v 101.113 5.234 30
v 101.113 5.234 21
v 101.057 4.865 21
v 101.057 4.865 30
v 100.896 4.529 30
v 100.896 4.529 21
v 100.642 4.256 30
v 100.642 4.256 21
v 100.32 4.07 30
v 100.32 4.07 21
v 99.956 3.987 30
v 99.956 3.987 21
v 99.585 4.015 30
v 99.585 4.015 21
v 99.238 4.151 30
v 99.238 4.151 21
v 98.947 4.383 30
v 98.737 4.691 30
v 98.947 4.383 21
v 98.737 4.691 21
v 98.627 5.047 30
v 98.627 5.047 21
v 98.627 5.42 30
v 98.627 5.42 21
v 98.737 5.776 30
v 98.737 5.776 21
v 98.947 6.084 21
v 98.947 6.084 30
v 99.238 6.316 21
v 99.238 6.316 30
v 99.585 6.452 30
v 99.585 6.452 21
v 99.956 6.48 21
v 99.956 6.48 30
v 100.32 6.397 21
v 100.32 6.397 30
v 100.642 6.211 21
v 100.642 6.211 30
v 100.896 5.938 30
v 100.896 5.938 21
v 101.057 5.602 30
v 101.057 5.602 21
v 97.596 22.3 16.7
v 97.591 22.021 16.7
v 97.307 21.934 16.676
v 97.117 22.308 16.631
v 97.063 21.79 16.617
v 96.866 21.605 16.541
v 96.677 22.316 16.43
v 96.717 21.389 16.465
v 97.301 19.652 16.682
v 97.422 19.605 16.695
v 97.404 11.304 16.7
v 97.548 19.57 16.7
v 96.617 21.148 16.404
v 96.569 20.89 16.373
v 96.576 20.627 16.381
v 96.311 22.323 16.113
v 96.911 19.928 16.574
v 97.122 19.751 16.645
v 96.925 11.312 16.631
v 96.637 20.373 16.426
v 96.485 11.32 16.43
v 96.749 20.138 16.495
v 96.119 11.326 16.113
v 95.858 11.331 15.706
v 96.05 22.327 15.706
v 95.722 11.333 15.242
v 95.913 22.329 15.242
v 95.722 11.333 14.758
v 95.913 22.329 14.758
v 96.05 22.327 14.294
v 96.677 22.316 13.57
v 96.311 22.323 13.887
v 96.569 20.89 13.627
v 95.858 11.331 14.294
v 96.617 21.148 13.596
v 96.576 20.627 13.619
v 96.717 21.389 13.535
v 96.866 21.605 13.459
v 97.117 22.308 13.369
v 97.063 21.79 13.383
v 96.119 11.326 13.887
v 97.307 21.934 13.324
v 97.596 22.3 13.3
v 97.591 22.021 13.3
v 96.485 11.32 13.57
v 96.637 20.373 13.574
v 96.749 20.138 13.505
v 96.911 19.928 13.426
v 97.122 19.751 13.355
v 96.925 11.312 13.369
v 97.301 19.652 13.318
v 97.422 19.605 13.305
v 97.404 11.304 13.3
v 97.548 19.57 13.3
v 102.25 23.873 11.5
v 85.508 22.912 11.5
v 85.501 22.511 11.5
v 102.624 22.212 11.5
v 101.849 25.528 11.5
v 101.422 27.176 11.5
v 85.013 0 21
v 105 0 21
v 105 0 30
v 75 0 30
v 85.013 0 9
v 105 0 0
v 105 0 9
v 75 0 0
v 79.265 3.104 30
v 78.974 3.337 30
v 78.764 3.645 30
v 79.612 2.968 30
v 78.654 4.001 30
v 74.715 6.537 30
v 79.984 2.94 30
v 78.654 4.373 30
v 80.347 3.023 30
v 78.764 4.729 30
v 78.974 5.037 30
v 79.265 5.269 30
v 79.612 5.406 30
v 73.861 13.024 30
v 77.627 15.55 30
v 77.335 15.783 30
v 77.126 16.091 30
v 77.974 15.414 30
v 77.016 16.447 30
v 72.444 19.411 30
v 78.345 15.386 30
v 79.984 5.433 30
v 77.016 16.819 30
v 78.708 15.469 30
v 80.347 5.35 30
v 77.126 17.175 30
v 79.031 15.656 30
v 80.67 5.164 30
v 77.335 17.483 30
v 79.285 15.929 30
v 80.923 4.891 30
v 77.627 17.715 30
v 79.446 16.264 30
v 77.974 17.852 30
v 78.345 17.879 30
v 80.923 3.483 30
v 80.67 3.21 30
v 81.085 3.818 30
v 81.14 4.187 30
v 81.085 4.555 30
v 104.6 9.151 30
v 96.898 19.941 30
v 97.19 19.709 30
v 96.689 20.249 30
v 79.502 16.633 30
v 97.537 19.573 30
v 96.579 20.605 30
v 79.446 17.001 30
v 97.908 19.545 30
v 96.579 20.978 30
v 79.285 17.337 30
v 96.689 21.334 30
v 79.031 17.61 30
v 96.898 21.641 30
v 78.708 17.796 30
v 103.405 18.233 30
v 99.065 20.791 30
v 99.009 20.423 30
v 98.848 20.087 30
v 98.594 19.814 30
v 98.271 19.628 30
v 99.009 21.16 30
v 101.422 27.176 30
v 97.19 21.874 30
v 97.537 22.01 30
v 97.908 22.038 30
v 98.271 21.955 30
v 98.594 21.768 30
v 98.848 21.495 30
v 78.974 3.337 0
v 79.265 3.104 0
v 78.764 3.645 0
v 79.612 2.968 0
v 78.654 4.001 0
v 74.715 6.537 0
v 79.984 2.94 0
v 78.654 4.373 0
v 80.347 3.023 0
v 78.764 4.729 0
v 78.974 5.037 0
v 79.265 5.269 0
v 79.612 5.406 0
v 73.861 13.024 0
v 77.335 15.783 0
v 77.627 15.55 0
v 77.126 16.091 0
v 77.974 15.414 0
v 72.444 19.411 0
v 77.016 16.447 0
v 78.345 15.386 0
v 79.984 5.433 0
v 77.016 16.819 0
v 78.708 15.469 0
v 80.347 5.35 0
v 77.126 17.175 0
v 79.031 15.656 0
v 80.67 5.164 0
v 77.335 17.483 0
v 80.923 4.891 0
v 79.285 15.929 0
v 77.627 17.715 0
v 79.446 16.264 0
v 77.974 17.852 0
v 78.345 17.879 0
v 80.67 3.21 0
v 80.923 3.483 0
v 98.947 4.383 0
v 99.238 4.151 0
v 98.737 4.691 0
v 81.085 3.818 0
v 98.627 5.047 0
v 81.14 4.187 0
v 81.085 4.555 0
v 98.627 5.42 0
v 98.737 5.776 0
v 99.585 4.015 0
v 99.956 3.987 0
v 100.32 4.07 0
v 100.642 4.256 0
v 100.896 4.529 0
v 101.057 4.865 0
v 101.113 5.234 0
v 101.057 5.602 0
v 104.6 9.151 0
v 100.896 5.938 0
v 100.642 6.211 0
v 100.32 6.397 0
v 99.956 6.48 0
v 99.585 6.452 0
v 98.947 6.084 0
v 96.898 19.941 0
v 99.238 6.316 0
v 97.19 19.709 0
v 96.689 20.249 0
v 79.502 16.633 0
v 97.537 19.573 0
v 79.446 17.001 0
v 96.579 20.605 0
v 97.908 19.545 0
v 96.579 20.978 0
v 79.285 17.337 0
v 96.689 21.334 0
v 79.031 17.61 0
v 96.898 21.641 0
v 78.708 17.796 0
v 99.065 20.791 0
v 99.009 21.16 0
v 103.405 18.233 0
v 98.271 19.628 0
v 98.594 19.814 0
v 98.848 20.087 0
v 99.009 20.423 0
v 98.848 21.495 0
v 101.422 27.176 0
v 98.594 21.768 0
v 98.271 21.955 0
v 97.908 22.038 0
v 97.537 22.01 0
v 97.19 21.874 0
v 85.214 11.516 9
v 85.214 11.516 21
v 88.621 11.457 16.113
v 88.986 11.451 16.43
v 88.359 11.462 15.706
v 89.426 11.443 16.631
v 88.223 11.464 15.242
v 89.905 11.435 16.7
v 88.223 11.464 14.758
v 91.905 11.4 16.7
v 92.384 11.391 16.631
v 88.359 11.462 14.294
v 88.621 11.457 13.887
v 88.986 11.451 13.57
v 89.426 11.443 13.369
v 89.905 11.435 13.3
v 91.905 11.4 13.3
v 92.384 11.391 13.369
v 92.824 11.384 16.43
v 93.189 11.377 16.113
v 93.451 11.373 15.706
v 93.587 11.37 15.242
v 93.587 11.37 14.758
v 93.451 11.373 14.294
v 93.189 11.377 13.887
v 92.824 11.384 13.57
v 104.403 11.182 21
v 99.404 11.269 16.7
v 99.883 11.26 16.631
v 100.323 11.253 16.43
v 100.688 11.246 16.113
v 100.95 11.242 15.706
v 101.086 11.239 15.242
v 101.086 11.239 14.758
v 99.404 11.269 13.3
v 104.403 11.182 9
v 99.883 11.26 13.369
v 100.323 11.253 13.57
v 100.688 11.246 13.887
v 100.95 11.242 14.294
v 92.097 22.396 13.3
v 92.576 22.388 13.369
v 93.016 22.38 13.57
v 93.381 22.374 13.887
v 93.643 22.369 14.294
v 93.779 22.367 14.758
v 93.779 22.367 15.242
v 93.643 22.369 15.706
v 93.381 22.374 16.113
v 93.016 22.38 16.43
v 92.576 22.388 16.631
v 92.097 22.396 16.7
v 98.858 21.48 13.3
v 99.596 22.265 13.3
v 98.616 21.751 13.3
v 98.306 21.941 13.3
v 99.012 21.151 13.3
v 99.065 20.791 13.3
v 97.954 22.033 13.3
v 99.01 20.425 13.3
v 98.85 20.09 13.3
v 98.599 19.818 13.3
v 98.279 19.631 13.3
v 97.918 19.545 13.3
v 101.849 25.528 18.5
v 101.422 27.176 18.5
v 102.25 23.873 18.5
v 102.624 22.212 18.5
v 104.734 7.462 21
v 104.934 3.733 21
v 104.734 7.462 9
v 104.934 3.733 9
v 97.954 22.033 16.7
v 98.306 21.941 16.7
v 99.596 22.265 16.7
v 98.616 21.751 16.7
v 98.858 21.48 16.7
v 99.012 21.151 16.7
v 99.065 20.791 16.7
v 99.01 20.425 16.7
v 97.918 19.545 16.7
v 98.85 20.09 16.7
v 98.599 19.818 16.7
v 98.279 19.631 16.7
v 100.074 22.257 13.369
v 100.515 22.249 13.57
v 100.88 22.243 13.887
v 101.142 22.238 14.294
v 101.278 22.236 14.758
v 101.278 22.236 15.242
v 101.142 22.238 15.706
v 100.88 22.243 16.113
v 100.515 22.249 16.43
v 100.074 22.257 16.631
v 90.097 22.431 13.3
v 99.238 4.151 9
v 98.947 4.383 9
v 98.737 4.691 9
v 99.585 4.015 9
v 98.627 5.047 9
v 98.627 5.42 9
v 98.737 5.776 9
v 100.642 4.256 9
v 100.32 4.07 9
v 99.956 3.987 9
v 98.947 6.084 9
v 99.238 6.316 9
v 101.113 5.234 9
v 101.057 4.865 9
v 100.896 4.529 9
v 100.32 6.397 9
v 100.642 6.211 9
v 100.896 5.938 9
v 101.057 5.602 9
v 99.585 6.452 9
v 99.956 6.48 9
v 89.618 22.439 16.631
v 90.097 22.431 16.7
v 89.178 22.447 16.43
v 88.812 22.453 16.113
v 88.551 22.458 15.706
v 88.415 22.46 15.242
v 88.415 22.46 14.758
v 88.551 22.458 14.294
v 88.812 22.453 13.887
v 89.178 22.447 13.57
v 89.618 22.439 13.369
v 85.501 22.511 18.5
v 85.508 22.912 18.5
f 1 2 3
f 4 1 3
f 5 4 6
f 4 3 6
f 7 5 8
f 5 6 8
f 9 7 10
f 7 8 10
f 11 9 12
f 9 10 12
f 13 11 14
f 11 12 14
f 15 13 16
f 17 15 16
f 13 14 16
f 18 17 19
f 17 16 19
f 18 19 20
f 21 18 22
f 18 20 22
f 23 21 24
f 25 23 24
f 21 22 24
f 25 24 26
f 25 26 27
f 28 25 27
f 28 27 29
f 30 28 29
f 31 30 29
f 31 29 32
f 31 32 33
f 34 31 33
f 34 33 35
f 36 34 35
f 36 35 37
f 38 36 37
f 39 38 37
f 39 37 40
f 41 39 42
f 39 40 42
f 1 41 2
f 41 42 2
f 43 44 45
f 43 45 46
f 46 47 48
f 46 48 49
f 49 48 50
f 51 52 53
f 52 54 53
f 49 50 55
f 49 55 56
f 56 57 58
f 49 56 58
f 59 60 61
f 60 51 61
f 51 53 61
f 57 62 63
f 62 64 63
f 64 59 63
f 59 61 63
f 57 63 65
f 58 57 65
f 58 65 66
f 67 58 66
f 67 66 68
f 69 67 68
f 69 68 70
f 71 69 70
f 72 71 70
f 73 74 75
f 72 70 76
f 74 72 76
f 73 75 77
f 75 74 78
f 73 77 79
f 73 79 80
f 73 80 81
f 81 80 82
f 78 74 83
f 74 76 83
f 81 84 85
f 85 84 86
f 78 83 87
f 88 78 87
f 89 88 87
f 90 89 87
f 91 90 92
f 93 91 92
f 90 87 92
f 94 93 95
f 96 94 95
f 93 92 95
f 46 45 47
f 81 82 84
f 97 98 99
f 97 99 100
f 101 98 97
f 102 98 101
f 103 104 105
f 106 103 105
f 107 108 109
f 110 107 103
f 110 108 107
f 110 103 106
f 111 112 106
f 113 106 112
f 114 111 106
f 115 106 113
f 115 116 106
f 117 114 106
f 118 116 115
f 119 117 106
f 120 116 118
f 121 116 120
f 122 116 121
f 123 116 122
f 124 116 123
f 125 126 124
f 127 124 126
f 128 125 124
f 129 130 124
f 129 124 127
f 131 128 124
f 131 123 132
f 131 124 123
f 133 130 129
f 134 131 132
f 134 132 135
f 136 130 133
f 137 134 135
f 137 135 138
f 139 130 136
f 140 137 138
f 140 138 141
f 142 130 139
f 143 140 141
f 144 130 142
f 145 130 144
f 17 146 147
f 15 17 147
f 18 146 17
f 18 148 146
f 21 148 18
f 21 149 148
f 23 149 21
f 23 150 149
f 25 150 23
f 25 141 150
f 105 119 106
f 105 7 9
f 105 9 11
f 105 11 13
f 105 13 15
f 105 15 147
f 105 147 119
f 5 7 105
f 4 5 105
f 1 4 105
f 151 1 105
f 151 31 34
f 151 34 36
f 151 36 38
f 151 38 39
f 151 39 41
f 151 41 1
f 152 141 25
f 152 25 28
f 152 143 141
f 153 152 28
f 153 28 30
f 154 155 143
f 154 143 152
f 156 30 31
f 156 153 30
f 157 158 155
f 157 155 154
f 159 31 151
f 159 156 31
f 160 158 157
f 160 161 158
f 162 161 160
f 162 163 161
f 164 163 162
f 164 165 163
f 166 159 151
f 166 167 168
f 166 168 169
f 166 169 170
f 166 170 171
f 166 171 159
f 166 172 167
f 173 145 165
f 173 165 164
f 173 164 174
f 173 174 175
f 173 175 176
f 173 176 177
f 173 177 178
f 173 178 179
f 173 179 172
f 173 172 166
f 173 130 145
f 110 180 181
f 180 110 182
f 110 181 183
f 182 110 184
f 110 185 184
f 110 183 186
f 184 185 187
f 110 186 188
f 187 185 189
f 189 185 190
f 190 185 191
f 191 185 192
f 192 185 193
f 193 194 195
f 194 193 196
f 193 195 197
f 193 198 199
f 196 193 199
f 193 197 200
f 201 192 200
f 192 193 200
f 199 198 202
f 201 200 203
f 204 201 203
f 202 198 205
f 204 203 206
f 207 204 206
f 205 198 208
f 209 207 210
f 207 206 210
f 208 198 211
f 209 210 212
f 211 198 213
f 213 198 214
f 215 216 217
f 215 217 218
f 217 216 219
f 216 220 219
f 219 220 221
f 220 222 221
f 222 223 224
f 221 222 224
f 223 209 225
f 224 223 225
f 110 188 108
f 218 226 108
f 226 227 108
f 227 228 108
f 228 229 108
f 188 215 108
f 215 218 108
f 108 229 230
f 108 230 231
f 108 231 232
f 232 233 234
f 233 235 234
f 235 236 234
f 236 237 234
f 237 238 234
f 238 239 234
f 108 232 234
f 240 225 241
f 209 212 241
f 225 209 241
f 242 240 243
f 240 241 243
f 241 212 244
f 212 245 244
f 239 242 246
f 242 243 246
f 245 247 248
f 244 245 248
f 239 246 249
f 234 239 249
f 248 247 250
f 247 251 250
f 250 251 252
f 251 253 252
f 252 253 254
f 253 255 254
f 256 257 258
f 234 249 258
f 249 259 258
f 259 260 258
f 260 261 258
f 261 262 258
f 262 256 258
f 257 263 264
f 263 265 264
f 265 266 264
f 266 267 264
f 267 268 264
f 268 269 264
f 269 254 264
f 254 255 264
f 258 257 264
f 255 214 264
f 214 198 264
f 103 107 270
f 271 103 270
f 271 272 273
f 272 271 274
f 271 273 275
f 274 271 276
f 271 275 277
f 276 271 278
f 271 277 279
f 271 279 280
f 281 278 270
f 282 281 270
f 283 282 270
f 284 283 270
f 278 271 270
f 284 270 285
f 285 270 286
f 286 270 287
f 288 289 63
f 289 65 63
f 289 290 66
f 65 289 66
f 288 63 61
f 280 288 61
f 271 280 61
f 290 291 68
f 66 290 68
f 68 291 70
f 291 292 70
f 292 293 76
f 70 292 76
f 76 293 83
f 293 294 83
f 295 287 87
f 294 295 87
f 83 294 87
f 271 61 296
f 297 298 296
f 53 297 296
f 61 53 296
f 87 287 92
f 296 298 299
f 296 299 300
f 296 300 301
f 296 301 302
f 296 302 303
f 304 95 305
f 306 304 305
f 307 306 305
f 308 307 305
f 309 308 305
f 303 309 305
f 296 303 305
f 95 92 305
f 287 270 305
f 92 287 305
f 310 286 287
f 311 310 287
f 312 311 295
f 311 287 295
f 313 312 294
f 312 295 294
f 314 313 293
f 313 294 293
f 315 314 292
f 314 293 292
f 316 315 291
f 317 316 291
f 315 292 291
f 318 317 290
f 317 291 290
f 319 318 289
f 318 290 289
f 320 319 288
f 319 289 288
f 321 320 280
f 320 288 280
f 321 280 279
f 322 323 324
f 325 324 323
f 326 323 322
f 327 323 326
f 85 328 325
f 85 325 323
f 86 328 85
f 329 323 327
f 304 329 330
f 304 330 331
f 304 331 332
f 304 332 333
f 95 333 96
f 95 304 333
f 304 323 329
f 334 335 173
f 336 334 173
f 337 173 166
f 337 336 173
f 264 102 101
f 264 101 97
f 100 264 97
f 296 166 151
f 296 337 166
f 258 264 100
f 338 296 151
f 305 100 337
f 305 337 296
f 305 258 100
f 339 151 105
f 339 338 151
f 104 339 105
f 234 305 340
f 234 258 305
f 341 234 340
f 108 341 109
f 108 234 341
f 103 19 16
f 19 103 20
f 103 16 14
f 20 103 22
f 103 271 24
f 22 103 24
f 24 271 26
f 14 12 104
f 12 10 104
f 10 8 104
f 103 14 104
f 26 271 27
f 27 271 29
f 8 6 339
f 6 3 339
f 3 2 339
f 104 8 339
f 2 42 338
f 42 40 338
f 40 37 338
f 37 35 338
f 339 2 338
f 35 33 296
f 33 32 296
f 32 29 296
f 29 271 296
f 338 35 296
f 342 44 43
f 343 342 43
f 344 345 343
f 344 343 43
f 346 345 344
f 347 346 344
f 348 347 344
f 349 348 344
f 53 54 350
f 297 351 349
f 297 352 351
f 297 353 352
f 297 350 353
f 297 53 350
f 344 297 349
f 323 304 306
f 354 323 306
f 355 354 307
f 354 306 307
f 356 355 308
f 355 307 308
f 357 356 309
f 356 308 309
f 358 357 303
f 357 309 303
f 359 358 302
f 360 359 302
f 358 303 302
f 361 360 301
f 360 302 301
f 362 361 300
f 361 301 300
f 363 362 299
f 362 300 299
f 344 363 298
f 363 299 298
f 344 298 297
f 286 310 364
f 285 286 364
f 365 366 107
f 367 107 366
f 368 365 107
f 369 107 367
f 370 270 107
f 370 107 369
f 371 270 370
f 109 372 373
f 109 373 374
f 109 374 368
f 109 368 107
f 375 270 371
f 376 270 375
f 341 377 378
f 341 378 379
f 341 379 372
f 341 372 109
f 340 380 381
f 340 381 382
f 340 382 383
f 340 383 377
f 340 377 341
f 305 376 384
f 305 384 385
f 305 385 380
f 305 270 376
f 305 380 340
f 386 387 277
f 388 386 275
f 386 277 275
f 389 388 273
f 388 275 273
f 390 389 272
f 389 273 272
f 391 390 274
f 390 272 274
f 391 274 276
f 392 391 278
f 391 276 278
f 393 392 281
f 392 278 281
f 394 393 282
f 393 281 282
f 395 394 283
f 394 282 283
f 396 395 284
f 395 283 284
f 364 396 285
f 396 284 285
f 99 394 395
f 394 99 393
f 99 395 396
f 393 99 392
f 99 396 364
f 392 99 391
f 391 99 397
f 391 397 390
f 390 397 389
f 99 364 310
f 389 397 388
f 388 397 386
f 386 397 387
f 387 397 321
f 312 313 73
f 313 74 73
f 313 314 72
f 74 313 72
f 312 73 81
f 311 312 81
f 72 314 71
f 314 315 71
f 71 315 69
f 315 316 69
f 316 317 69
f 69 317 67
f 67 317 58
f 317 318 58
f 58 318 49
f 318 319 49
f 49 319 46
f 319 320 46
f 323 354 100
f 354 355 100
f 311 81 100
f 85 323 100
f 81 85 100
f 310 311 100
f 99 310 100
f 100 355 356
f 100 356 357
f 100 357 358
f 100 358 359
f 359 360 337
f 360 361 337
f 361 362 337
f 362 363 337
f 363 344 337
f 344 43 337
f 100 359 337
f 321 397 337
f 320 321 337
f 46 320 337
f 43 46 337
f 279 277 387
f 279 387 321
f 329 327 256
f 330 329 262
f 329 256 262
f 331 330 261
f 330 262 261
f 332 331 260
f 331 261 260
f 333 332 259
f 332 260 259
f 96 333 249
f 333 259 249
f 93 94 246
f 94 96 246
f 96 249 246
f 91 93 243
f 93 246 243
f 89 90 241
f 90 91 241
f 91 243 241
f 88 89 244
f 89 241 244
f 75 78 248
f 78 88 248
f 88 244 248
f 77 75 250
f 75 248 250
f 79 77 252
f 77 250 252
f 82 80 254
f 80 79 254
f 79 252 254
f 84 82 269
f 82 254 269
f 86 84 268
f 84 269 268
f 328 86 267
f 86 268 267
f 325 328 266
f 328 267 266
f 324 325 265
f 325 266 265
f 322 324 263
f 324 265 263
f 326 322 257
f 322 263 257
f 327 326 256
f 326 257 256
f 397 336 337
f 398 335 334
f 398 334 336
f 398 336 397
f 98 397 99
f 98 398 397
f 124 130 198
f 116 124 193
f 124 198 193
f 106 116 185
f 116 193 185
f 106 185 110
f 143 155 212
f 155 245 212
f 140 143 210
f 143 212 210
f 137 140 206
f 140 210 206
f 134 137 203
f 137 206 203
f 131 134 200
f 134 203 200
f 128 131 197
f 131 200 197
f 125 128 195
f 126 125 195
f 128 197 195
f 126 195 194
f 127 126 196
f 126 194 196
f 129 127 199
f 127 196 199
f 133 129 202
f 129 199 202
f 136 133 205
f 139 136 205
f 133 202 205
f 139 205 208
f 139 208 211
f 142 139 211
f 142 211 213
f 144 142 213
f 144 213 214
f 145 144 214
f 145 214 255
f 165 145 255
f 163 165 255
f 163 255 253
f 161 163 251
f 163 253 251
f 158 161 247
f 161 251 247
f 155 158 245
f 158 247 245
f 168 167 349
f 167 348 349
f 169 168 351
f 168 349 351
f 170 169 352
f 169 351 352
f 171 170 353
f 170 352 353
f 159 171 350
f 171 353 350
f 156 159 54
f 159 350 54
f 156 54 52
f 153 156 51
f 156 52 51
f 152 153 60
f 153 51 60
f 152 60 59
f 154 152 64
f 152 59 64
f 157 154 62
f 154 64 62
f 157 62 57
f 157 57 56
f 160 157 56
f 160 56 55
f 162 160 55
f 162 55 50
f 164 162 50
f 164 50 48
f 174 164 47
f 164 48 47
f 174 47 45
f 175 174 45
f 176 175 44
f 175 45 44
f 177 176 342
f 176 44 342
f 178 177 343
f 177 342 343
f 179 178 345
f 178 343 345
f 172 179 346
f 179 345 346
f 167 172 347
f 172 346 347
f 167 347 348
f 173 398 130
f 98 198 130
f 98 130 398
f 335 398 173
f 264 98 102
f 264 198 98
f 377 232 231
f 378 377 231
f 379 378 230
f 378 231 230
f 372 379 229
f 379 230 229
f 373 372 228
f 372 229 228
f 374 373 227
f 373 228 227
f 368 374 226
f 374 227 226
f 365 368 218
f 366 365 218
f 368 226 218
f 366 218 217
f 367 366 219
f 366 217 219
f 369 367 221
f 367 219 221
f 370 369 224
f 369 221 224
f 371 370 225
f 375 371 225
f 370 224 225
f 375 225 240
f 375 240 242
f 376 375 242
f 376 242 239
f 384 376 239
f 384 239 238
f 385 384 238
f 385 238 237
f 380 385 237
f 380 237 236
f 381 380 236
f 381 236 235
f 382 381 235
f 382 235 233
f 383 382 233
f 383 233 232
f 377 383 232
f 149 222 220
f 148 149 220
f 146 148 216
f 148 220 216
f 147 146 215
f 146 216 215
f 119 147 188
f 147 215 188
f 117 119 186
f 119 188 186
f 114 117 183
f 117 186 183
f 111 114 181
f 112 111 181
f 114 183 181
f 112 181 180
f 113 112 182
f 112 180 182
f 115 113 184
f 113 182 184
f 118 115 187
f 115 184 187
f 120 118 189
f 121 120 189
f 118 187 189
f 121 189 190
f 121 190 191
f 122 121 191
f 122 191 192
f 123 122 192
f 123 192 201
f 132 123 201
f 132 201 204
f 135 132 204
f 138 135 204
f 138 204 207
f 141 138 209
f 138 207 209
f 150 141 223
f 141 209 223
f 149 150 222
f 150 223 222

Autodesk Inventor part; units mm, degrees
ref_plane "YZ Plane" through (0, 0, 0) normal (1, 0, 0) x (0, 1, 0)
ref_plane "XZ Plane" through (0, 0, 0) normal (0, 1, 0) x (-1, 0, 0)
ref_plane "XY Plane" through (0, 0, 0) normal (0, 0, 1) x (1, 0, 0)
sketch "Sketch1" plane through (0, 0, 0) normal (0, 0, 1) x (1, 0, 0)
  arc A0 (75, 0) -> (72.4444, 19.4114) centre (0, 0) ccw
  arc A1 (105, 0) -> (101.4222, 27.176) centre (0, 0) ccw
  line L0 (105, 0) -> (75, 0)
  line L1 (72.4444, 19.4114) -> (101.4222, 27.176)
  line L2 (75, 0) -> (0, 0)
  line L3 (0, 0) -> (72.4444, 19.4114)
  circle A2 centre (78.2518, 16.6329) radius 1.25
  circle A3 centre (79.8904, 4.1869) radius 1.25
  circle A4 centre (97.8148, 20.7912) radius 1.25
  circle A5 centre (99.863, 5.2336) radius 1.25
  line L4 (0, 0) -> (78.2518, 16.6329)
  line L5 (78.2518, 16.6329) -> (97.8148, 20.7912)
  line L6 (99.863, 5.2336) -> (79.8904, 4.1869)
  line L7 (79.8904, 4.1869) -> (0, 0)
  dimension "d0" = 20
  dimension "d1" = 15
  dimension "d2" = 3
  dimension "d3" = 3
  dimension "d4" = 2.5
  dimension "d5" = 80
  dimension "d6" = 75
  dimension "d7" = 105
  dimension "d8" = 80
  dimension "d9" = 20
extrude "Extrusion1" add sketch "Sketch1" along normal blind 30 contours A0 L1 A1 L0
ref_plane "Work Plane1" through (0, 0, 15) normal (0, 0, 1) x (1, 0, 0)
sketch "Sketch2" plane through (0, 0, 15) normal (0, 0, 1) x (1, 0, 0)
  line L0 (75, 0) -> (105, 0) projected
  line L1 (75, 0) -> (0, 0)
  line L2 (0, 0) -> (189.2794, -3.3039)
  line L3 (84.9871, -1.4835) -> (85.214, 11.5165)
  line L4 (85.214, 11.5165) -> (105.2109, 11.1675)
  line L5 (105.2109, 11.1675) -> (104.984, -1.8325)
  dimension "d12" = 13
  dimension "d13" = 1
  dimension "d14" = 85
  dimension "d15" = 105
extrude "Extrusion2" cut sketch "Sketch2" along normal mid plane 12 contours L3 L4 L5 L2
sketch "Sketch3" plane through (104.4029, 11.1816, 9) normal (-0.0174524, -0.9998477, 0) x (0.9998477, -0.0174524, 0)
  arc A0 (-5, 4.3) -> (-5, 7.7) centre (-5, 6) ccw
  arc A1 (-7, 7.7) -> (-7, 4.3) centre (-7, 6) ccw
  line L0 (-7, 7.7) -> (-5, 7.7)
  line L1 (-5, 4.3) -> (-7, 4.3)
  line L2 (-19.1919, 12) -> (0.7921, 12) projected
  line L3 (0, 12) -> (0, 0) projected
  point P0 (-104.1919, -9)
  dimension "d19" = 3.4
  dimension "d20" = 6
  dimension "d21" = 5
  dimension "d22" = 2
extrude "Extrusion3" cut sketch "Sketch3" against normal blind 20
pattern_linear "Rectangular Pattern1" count 2 spacing 7.5 along (-0.9998477, 0.0174524, 0) of "Extrusion3"
ref_plane "Work Plane2" through (104.6822, 27.1792, 9) normal (-0.0174524, -0.9998477, 0) x (0.9998477, -0.0174524, 0)
sketch "Sketch5" plane through (104.6822, 27.1792, 9) normal (-0.0174524, -0.9998477, 0) x (0.9998477, -0.0174524, 0)
  line L0 (-19.0973, 2.5) -> (0.9027, 2.5)
  line L1 (0.9027, 2.5) -> (0.9027, 9.5)
  line L2 (0.9027, 9.5) -> (-19.0973, 9.5)
  line L3 (-19.0973, 9.5) -> (-19.0973, 2.5)
  line L4 (-3.2594, 21) -> (-32.0973, 21) projected
  line L5 (-32.0973, -9) -> (-32.0973, 21) projected
  point P0 (-104.1919, -9)
  point P1 (-19.0973, 6)
  dimension "d29" = 7
  dimension "d30" = 15
  dimension "d31" = 13
  dimension "d32" = 20
extrude "Extrusion4" cut sketch "Sketch5" along normal blind 5
properties part number "load_cell_mounting_block2"
